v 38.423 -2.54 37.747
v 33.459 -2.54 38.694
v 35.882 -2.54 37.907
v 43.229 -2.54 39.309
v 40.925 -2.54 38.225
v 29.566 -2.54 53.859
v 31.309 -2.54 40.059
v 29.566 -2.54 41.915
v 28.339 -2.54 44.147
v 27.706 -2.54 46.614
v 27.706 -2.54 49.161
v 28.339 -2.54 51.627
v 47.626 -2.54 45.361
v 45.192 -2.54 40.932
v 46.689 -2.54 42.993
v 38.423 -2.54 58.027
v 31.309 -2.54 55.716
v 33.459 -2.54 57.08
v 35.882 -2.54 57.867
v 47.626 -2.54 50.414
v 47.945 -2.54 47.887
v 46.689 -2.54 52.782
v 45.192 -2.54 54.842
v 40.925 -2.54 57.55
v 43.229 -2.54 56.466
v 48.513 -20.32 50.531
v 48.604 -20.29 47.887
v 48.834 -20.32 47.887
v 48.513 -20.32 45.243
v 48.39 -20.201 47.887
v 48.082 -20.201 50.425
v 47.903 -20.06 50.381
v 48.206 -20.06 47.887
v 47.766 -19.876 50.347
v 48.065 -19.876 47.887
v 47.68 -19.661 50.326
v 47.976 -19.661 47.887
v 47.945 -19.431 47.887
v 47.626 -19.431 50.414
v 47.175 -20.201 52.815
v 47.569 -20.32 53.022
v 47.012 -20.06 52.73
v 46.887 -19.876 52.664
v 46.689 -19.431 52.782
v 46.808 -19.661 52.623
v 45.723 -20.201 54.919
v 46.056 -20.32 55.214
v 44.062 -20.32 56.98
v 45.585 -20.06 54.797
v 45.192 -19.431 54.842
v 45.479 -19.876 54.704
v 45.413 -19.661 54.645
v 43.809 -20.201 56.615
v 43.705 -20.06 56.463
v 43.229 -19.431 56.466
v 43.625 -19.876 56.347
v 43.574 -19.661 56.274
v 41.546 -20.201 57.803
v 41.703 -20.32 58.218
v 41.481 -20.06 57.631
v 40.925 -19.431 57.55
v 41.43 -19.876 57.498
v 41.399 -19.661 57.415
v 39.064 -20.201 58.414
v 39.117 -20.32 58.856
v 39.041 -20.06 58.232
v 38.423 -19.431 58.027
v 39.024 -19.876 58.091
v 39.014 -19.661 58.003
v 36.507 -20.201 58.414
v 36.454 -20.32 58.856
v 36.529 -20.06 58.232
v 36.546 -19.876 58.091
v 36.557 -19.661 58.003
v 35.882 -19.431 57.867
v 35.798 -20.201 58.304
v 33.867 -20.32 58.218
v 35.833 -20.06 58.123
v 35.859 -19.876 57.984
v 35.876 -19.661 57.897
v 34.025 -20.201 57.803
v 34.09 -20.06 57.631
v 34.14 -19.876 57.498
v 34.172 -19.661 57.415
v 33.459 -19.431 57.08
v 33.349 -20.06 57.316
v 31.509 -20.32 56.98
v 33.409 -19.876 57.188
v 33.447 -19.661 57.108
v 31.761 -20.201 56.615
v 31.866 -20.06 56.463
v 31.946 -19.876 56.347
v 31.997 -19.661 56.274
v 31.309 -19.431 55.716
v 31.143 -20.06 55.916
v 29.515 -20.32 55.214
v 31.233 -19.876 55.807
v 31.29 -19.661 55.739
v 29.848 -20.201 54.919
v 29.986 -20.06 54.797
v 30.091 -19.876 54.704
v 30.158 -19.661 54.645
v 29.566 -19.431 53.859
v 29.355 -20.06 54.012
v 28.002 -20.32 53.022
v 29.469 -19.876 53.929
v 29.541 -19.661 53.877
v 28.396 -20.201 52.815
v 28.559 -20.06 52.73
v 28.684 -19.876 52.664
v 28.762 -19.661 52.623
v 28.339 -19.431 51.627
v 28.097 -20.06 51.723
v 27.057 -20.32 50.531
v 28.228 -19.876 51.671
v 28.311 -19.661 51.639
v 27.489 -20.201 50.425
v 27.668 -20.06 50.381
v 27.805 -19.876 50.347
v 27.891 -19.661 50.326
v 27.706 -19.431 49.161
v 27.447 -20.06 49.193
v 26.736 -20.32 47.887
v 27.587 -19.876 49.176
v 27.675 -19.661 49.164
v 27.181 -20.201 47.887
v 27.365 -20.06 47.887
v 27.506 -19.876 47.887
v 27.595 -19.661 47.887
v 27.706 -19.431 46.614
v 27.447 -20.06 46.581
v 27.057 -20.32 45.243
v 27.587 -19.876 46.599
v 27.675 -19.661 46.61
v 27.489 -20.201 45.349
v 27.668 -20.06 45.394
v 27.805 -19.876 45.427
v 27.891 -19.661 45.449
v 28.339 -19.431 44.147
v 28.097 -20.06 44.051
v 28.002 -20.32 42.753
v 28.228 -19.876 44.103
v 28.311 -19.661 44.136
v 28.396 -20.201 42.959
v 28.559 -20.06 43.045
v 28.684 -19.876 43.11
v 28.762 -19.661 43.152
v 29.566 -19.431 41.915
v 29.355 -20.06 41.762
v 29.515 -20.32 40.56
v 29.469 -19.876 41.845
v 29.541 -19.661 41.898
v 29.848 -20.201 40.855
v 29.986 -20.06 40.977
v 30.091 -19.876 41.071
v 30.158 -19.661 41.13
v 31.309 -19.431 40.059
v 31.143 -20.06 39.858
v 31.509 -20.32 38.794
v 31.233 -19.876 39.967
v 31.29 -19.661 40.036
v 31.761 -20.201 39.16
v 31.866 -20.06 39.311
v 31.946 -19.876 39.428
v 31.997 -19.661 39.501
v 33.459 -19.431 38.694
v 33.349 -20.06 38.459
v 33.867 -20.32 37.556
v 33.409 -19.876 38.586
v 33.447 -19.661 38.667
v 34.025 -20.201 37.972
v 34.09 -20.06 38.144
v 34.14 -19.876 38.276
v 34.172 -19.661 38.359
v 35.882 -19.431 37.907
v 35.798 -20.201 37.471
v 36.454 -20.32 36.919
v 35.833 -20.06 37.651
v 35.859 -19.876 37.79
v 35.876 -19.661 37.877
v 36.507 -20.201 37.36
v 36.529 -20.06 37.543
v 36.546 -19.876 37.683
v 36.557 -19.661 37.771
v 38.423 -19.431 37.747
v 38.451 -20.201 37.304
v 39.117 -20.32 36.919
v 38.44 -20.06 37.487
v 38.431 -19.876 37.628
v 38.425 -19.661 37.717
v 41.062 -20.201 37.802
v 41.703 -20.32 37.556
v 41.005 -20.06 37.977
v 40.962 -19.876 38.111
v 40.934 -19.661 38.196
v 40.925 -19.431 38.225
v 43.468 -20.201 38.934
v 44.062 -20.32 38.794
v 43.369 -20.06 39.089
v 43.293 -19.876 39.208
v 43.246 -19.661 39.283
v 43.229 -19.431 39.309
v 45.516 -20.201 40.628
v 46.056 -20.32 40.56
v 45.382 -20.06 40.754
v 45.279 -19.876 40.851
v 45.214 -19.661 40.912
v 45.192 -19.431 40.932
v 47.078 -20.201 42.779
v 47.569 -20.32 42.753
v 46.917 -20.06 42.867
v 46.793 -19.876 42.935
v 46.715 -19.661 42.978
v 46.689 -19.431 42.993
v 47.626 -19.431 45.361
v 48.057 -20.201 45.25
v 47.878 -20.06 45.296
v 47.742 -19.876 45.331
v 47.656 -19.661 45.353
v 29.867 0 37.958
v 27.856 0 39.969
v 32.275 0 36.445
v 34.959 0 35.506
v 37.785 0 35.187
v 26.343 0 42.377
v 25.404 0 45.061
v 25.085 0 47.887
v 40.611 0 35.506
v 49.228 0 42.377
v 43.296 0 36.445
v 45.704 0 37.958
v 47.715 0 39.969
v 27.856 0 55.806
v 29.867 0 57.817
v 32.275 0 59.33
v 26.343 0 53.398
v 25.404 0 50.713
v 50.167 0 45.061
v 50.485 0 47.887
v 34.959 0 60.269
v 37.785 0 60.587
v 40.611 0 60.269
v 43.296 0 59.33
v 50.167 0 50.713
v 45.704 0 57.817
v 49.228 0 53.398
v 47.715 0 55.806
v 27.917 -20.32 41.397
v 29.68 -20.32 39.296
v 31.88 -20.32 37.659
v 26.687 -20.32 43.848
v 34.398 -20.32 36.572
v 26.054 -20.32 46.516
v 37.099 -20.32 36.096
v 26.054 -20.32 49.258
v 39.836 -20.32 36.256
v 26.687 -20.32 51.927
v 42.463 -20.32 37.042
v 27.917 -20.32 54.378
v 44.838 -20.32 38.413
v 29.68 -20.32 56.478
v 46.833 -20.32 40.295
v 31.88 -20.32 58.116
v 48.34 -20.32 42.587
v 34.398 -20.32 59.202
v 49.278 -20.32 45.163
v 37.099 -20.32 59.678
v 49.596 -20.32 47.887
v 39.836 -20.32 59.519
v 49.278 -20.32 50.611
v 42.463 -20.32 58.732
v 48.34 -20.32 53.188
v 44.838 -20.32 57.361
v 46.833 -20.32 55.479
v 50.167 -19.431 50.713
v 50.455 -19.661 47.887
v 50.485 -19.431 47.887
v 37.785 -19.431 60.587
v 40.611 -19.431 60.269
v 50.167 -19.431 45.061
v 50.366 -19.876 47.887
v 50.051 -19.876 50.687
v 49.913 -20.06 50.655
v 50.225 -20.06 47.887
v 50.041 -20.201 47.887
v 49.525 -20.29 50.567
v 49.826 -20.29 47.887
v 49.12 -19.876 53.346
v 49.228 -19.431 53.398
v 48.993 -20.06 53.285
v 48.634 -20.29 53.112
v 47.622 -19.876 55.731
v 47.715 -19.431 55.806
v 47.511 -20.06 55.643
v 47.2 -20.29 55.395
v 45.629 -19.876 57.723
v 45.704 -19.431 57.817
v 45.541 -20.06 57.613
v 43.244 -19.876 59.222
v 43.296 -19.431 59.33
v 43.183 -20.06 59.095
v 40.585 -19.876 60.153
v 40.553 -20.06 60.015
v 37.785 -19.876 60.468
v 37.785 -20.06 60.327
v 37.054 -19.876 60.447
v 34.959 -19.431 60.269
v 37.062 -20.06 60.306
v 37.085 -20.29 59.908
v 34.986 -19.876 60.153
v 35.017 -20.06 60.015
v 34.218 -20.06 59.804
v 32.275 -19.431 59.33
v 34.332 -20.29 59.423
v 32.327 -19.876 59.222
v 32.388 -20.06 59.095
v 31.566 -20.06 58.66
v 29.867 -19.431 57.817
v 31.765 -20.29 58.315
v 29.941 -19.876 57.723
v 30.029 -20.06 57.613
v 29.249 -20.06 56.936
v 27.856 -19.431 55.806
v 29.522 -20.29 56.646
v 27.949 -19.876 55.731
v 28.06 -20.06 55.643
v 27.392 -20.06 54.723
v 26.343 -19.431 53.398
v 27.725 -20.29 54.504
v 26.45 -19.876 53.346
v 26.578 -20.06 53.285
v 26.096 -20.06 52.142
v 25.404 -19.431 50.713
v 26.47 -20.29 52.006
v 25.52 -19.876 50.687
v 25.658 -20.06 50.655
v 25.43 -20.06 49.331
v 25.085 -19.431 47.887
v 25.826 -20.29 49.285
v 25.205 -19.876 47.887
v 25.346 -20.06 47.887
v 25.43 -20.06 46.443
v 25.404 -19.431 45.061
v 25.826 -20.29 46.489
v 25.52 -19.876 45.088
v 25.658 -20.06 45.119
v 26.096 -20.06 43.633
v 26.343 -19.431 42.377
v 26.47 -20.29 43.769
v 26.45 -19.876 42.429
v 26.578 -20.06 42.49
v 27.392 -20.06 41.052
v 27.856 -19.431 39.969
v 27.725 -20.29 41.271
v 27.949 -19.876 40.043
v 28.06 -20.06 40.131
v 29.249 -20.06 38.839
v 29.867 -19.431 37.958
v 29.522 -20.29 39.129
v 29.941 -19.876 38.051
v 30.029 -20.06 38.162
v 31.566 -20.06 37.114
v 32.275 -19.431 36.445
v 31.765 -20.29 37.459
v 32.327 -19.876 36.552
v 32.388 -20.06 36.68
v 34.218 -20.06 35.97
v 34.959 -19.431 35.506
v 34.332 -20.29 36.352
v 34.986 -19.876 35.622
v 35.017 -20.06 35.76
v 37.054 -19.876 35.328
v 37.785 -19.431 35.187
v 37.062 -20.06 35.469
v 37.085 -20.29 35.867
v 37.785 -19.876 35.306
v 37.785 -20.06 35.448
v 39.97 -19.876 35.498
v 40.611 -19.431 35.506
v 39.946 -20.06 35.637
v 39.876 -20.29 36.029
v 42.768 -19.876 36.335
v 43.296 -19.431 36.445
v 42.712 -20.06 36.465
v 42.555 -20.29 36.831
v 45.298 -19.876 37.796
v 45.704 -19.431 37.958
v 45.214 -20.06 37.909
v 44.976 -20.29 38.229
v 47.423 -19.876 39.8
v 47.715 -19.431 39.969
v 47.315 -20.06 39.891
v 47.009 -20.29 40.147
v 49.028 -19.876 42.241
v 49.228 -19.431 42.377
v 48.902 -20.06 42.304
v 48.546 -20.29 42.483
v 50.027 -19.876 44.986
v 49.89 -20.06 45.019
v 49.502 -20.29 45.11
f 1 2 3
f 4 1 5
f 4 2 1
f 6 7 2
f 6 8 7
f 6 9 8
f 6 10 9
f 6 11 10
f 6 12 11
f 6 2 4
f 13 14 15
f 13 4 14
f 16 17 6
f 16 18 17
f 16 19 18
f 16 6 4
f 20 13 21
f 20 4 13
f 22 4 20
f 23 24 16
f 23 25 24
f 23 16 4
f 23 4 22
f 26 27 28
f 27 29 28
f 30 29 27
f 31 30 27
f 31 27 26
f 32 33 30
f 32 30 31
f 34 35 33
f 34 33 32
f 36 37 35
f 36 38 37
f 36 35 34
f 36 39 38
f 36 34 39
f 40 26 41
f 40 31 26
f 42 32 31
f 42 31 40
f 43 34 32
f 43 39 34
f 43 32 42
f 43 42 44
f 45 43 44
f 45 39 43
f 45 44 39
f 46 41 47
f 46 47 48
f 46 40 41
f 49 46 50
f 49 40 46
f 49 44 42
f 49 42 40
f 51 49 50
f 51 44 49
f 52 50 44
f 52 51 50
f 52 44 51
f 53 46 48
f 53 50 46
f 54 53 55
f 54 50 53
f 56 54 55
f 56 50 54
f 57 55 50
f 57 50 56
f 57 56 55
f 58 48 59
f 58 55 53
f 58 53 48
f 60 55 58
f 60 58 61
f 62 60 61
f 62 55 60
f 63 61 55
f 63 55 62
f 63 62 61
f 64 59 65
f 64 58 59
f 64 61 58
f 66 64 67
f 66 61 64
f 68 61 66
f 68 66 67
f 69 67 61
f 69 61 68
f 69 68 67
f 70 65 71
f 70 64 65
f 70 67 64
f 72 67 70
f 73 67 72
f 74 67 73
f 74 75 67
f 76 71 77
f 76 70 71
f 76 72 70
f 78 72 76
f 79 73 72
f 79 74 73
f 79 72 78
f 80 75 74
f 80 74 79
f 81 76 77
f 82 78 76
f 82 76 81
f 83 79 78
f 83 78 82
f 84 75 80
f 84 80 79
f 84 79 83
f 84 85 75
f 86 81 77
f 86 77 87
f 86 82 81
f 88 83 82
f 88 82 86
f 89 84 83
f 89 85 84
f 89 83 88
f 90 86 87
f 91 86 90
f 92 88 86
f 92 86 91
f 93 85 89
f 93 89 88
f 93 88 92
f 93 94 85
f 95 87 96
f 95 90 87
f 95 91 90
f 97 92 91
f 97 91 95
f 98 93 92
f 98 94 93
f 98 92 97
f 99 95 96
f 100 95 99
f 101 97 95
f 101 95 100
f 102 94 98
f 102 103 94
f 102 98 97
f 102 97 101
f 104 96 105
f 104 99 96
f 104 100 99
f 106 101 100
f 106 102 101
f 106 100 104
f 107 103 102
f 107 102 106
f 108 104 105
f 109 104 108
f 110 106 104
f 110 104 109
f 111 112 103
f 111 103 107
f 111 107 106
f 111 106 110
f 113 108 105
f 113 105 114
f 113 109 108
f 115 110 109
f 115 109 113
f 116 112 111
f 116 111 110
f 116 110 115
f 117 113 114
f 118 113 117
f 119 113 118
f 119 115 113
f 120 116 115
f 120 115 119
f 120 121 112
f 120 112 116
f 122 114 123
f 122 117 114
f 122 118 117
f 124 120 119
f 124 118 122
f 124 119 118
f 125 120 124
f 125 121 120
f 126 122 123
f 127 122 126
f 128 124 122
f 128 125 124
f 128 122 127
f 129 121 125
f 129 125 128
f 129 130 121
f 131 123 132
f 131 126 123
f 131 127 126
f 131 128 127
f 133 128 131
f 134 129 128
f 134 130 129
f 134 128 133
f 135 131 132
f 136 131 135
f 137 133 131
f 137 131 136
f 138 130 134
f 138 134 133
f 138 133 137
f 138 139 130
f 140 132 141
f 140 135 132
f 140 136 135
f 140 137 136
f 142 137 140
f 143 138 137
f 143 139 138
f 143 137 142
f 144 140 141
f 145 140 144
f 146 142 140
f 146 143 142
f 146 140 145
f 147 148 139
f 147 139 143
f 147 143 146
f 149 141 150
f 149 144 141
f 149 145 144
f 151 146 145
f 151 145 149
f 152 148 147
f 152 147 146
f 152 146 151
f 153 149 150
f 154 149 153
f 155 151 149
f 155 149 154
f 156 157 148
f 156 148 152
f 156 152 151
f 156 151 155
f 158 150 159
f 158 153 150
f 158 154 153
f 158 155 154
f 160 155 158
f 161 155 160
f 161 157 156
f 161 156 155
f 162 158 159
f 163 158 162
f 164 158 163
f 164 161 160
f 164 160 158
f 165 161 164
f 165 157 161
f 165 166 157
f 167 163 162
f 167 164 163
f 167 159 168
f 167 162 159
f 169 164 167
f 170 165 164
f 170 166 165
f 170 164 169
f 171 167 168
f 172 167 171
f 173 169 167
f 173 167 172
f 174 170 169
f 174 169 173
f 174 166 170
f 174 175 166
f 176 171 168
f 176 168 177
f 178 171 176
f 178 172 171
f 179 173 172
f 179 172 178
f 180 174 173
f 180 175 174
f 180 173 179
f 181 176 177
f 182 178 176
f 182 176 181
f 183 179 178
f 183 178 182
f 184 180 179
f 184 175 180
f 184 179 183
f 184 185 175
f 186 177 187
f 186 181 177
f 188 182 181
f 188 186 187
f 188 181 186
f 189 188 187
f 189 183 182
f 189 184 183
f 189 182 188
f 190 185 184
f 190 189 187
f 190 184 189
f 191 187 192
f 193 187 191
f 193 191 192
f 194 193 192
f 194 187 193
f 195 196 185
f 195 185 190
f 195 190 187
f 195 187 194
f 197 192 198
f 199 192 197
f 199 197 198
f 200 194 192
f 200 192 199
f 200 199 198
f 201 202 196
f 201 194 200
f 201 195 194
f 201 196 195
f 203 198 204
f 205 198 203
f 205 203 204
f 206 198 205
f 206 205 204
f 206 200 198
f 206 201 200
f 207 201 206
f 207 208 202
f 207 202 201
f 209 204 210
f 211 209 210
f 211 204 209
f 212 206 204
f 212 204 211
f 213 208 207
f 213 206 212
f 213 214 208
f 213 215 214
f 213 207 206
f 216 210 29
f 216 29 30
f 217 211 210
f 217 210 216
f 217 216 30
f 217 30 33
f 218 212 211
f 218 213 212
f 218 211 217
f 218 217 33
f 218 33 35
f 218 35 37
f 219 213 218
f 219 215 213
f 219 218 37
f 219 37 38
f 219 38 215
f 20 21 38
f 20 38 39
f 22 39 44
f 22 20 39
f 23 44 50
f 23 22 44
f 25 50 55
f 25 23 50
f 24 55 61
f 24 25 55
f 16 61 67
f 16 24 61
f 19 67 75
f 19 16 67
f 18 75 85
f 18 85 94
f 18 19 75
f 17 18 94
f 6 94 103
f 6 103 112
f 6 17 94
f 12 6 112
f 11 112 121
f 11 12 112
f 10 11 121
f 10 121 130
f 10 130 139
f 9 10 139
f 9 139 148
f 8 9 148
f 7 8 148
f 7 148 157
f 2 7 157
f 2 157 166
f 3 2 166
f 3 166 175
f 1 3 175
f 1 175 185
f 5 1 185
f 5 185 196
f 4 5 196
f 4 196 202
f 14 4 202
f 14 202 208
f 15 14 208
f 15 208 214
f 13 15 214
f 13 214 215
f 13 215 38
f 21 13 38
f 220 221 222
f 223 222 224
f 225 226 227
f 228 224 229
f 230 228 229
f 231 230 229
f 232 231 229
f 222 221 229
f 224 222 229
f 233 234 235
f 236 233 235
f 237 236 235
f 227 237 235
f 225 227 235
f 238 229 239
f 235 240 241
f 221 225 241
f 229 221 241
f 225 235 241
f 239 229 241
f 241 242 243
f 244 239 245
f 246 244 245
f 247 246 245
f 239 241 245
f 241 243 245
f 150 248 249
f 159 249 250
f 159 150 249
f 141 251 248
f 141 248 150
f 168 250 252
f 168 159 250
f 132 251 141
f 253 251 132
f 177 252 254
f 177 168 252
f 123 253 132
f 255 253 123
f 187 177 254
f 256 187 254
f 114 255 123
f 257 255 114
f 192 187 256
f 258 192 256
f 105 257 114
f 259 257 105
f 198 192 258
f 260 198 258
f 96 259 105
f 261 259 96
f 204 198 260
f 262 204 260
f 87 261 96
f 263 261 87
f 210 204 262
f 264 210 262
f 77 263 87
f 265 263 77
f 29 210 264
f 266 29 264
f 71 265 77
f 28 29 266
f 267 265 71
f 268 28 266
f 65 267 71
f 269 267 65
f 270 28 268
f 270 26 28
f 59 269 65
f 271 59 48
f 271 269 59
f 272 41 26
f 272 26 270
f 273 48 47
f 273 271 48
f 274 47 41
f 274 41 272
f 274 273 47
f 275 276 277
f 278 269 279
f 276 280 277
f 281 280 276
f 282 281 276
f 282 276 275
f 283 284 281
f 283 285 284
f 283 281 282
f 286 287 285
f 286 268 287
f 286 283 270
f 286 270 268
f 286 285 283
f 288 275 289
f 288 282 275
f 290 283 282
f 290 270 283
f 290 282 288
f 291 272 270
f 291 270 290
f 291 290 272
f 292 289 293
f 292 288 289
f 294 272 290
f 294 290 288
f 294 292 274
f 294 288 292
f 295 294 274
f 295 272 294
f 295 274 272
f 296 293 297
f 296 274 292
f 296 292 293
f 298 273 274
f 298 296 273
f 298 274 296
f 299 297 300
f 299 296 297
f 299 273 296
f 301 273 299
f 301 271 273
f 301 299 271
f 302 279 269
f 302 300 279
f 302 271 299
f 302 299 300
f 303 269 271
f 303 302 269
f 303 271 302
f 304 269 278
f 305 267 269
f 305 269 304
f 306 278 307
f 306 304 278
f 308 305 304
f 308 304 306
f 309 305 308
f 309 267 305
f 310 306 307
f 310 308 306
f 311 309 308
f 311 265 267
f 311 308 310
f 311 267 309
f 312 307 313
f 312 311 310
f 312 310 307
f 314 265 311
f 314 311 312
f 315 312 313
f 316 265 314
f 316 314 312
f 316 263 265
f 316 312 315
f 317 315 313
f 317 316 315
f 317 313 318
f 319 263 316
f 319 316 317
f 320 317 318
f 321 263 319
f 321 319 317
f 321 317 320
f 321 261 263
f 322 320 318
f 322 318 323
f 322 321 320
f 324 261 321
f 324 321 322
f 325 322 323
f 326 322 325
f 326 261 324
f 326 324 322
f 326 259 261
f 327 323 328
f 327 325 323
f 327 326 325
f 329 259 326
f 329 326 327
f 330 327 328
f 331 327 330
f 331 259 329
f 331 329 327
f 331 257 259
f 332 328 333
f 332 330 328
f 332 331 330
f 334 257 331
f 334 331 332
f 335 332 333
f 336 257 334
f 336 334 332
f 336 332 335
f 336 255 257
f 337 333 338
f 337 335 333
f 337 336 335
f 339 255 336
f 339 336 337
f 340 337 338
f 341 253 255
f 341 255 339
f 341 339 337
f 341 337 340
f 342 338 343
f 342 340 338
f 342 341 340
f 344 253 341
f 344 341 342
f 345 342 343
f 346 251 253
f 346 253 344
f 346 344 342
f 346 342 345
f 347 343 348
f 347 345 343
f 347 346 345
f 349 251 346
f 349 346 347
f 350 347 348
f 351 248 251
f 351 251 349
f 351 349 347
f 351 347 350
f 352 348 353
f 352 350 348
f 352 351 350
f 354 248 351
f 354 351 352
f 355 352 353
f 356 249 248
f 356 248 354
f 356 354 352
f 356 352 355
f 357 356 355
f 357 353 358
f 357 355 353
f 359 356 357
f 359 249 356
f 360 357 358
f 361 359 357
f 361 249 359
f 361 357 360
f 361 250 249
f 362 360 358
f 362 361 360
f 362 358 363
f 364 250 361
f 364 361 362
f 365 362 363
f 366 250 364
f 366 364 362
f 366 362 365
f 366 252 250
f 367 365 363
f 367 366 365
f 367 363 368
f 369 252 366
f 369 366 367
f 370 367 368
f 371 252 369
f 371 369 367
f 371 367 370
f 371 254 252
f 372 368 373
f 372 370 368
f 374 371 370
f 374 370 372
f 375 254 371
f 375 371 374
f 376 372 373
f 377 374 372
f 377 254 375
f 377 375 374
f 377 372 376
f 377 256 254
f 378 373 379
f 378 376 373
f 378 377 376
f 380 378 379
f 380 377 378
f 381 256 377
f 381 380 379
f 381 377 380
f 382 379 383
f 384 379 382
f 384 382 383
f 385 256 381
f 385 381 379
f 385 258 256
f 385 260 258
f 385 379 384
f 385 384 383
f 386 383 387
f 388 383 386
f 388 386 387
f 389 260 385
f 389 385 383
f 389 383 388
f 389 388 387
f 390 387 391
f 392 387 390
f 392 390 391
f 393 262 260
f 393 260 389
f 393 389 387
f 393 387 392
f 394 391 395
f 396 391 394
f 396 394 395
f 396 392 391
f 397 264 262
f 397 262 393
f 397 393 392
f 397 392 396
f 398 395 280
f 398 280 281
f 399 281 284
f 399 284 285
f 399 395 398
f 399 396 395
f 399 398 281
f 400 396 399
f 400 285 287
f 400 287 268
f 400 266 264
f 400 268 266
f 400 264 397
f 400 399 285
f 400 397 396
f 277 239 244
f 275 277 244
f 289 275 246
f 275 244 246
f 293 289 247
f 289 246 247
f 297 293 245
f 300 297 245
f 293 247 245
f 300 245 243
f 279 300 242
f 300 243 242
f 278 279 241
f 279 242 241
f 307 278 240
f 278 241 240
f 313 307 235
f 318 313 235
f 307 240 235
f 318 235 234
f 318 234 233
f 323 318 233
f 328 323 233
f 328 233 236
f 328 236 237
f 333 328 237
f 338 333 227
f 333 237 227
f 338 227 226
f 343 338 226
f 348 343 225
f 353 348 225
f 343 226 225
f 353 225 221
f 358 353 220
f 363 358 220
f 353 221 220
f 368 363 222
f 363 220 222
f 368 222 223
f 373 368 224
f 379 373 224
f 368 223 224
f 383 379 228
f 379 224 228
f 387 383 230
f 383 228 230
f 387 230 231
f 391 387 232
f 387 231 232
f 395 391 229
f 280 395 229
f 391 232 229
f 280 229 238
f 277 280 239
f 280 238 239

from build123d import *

# Parameters (mm, degrees)
F0_R     = 12.7
F1_DEPTH = 20.32
F2_T     = -2.54
F3_R     = 0.889


with BuildPart() as f1:
    # F0 (on Front) → F1 (new body)
    with BuildSketch(Plane.XZ):
        with Locations((37.7853997052, 47.8872768581)):
            Circle(F0_R)
    extrude(amount=F1_DEPTH)

    # F2
    f2_openings = [f1.faces().sort_by_distance(p)[0] for p in [
        (37.7854, -20.32, 47.887277),
    ]]
    offset(amount=F2_T, openings=f2_openings)

    # F3
    f3_edges = [f1.edges().sort_by_distance(p)[0] for p in [
        (25.0854, -20.32, 47.887277),
        (27.6254, -20.32, 47.887277),
    ]]
    fillet(f3_edges, radius=F3_R)


solid = f1.part
